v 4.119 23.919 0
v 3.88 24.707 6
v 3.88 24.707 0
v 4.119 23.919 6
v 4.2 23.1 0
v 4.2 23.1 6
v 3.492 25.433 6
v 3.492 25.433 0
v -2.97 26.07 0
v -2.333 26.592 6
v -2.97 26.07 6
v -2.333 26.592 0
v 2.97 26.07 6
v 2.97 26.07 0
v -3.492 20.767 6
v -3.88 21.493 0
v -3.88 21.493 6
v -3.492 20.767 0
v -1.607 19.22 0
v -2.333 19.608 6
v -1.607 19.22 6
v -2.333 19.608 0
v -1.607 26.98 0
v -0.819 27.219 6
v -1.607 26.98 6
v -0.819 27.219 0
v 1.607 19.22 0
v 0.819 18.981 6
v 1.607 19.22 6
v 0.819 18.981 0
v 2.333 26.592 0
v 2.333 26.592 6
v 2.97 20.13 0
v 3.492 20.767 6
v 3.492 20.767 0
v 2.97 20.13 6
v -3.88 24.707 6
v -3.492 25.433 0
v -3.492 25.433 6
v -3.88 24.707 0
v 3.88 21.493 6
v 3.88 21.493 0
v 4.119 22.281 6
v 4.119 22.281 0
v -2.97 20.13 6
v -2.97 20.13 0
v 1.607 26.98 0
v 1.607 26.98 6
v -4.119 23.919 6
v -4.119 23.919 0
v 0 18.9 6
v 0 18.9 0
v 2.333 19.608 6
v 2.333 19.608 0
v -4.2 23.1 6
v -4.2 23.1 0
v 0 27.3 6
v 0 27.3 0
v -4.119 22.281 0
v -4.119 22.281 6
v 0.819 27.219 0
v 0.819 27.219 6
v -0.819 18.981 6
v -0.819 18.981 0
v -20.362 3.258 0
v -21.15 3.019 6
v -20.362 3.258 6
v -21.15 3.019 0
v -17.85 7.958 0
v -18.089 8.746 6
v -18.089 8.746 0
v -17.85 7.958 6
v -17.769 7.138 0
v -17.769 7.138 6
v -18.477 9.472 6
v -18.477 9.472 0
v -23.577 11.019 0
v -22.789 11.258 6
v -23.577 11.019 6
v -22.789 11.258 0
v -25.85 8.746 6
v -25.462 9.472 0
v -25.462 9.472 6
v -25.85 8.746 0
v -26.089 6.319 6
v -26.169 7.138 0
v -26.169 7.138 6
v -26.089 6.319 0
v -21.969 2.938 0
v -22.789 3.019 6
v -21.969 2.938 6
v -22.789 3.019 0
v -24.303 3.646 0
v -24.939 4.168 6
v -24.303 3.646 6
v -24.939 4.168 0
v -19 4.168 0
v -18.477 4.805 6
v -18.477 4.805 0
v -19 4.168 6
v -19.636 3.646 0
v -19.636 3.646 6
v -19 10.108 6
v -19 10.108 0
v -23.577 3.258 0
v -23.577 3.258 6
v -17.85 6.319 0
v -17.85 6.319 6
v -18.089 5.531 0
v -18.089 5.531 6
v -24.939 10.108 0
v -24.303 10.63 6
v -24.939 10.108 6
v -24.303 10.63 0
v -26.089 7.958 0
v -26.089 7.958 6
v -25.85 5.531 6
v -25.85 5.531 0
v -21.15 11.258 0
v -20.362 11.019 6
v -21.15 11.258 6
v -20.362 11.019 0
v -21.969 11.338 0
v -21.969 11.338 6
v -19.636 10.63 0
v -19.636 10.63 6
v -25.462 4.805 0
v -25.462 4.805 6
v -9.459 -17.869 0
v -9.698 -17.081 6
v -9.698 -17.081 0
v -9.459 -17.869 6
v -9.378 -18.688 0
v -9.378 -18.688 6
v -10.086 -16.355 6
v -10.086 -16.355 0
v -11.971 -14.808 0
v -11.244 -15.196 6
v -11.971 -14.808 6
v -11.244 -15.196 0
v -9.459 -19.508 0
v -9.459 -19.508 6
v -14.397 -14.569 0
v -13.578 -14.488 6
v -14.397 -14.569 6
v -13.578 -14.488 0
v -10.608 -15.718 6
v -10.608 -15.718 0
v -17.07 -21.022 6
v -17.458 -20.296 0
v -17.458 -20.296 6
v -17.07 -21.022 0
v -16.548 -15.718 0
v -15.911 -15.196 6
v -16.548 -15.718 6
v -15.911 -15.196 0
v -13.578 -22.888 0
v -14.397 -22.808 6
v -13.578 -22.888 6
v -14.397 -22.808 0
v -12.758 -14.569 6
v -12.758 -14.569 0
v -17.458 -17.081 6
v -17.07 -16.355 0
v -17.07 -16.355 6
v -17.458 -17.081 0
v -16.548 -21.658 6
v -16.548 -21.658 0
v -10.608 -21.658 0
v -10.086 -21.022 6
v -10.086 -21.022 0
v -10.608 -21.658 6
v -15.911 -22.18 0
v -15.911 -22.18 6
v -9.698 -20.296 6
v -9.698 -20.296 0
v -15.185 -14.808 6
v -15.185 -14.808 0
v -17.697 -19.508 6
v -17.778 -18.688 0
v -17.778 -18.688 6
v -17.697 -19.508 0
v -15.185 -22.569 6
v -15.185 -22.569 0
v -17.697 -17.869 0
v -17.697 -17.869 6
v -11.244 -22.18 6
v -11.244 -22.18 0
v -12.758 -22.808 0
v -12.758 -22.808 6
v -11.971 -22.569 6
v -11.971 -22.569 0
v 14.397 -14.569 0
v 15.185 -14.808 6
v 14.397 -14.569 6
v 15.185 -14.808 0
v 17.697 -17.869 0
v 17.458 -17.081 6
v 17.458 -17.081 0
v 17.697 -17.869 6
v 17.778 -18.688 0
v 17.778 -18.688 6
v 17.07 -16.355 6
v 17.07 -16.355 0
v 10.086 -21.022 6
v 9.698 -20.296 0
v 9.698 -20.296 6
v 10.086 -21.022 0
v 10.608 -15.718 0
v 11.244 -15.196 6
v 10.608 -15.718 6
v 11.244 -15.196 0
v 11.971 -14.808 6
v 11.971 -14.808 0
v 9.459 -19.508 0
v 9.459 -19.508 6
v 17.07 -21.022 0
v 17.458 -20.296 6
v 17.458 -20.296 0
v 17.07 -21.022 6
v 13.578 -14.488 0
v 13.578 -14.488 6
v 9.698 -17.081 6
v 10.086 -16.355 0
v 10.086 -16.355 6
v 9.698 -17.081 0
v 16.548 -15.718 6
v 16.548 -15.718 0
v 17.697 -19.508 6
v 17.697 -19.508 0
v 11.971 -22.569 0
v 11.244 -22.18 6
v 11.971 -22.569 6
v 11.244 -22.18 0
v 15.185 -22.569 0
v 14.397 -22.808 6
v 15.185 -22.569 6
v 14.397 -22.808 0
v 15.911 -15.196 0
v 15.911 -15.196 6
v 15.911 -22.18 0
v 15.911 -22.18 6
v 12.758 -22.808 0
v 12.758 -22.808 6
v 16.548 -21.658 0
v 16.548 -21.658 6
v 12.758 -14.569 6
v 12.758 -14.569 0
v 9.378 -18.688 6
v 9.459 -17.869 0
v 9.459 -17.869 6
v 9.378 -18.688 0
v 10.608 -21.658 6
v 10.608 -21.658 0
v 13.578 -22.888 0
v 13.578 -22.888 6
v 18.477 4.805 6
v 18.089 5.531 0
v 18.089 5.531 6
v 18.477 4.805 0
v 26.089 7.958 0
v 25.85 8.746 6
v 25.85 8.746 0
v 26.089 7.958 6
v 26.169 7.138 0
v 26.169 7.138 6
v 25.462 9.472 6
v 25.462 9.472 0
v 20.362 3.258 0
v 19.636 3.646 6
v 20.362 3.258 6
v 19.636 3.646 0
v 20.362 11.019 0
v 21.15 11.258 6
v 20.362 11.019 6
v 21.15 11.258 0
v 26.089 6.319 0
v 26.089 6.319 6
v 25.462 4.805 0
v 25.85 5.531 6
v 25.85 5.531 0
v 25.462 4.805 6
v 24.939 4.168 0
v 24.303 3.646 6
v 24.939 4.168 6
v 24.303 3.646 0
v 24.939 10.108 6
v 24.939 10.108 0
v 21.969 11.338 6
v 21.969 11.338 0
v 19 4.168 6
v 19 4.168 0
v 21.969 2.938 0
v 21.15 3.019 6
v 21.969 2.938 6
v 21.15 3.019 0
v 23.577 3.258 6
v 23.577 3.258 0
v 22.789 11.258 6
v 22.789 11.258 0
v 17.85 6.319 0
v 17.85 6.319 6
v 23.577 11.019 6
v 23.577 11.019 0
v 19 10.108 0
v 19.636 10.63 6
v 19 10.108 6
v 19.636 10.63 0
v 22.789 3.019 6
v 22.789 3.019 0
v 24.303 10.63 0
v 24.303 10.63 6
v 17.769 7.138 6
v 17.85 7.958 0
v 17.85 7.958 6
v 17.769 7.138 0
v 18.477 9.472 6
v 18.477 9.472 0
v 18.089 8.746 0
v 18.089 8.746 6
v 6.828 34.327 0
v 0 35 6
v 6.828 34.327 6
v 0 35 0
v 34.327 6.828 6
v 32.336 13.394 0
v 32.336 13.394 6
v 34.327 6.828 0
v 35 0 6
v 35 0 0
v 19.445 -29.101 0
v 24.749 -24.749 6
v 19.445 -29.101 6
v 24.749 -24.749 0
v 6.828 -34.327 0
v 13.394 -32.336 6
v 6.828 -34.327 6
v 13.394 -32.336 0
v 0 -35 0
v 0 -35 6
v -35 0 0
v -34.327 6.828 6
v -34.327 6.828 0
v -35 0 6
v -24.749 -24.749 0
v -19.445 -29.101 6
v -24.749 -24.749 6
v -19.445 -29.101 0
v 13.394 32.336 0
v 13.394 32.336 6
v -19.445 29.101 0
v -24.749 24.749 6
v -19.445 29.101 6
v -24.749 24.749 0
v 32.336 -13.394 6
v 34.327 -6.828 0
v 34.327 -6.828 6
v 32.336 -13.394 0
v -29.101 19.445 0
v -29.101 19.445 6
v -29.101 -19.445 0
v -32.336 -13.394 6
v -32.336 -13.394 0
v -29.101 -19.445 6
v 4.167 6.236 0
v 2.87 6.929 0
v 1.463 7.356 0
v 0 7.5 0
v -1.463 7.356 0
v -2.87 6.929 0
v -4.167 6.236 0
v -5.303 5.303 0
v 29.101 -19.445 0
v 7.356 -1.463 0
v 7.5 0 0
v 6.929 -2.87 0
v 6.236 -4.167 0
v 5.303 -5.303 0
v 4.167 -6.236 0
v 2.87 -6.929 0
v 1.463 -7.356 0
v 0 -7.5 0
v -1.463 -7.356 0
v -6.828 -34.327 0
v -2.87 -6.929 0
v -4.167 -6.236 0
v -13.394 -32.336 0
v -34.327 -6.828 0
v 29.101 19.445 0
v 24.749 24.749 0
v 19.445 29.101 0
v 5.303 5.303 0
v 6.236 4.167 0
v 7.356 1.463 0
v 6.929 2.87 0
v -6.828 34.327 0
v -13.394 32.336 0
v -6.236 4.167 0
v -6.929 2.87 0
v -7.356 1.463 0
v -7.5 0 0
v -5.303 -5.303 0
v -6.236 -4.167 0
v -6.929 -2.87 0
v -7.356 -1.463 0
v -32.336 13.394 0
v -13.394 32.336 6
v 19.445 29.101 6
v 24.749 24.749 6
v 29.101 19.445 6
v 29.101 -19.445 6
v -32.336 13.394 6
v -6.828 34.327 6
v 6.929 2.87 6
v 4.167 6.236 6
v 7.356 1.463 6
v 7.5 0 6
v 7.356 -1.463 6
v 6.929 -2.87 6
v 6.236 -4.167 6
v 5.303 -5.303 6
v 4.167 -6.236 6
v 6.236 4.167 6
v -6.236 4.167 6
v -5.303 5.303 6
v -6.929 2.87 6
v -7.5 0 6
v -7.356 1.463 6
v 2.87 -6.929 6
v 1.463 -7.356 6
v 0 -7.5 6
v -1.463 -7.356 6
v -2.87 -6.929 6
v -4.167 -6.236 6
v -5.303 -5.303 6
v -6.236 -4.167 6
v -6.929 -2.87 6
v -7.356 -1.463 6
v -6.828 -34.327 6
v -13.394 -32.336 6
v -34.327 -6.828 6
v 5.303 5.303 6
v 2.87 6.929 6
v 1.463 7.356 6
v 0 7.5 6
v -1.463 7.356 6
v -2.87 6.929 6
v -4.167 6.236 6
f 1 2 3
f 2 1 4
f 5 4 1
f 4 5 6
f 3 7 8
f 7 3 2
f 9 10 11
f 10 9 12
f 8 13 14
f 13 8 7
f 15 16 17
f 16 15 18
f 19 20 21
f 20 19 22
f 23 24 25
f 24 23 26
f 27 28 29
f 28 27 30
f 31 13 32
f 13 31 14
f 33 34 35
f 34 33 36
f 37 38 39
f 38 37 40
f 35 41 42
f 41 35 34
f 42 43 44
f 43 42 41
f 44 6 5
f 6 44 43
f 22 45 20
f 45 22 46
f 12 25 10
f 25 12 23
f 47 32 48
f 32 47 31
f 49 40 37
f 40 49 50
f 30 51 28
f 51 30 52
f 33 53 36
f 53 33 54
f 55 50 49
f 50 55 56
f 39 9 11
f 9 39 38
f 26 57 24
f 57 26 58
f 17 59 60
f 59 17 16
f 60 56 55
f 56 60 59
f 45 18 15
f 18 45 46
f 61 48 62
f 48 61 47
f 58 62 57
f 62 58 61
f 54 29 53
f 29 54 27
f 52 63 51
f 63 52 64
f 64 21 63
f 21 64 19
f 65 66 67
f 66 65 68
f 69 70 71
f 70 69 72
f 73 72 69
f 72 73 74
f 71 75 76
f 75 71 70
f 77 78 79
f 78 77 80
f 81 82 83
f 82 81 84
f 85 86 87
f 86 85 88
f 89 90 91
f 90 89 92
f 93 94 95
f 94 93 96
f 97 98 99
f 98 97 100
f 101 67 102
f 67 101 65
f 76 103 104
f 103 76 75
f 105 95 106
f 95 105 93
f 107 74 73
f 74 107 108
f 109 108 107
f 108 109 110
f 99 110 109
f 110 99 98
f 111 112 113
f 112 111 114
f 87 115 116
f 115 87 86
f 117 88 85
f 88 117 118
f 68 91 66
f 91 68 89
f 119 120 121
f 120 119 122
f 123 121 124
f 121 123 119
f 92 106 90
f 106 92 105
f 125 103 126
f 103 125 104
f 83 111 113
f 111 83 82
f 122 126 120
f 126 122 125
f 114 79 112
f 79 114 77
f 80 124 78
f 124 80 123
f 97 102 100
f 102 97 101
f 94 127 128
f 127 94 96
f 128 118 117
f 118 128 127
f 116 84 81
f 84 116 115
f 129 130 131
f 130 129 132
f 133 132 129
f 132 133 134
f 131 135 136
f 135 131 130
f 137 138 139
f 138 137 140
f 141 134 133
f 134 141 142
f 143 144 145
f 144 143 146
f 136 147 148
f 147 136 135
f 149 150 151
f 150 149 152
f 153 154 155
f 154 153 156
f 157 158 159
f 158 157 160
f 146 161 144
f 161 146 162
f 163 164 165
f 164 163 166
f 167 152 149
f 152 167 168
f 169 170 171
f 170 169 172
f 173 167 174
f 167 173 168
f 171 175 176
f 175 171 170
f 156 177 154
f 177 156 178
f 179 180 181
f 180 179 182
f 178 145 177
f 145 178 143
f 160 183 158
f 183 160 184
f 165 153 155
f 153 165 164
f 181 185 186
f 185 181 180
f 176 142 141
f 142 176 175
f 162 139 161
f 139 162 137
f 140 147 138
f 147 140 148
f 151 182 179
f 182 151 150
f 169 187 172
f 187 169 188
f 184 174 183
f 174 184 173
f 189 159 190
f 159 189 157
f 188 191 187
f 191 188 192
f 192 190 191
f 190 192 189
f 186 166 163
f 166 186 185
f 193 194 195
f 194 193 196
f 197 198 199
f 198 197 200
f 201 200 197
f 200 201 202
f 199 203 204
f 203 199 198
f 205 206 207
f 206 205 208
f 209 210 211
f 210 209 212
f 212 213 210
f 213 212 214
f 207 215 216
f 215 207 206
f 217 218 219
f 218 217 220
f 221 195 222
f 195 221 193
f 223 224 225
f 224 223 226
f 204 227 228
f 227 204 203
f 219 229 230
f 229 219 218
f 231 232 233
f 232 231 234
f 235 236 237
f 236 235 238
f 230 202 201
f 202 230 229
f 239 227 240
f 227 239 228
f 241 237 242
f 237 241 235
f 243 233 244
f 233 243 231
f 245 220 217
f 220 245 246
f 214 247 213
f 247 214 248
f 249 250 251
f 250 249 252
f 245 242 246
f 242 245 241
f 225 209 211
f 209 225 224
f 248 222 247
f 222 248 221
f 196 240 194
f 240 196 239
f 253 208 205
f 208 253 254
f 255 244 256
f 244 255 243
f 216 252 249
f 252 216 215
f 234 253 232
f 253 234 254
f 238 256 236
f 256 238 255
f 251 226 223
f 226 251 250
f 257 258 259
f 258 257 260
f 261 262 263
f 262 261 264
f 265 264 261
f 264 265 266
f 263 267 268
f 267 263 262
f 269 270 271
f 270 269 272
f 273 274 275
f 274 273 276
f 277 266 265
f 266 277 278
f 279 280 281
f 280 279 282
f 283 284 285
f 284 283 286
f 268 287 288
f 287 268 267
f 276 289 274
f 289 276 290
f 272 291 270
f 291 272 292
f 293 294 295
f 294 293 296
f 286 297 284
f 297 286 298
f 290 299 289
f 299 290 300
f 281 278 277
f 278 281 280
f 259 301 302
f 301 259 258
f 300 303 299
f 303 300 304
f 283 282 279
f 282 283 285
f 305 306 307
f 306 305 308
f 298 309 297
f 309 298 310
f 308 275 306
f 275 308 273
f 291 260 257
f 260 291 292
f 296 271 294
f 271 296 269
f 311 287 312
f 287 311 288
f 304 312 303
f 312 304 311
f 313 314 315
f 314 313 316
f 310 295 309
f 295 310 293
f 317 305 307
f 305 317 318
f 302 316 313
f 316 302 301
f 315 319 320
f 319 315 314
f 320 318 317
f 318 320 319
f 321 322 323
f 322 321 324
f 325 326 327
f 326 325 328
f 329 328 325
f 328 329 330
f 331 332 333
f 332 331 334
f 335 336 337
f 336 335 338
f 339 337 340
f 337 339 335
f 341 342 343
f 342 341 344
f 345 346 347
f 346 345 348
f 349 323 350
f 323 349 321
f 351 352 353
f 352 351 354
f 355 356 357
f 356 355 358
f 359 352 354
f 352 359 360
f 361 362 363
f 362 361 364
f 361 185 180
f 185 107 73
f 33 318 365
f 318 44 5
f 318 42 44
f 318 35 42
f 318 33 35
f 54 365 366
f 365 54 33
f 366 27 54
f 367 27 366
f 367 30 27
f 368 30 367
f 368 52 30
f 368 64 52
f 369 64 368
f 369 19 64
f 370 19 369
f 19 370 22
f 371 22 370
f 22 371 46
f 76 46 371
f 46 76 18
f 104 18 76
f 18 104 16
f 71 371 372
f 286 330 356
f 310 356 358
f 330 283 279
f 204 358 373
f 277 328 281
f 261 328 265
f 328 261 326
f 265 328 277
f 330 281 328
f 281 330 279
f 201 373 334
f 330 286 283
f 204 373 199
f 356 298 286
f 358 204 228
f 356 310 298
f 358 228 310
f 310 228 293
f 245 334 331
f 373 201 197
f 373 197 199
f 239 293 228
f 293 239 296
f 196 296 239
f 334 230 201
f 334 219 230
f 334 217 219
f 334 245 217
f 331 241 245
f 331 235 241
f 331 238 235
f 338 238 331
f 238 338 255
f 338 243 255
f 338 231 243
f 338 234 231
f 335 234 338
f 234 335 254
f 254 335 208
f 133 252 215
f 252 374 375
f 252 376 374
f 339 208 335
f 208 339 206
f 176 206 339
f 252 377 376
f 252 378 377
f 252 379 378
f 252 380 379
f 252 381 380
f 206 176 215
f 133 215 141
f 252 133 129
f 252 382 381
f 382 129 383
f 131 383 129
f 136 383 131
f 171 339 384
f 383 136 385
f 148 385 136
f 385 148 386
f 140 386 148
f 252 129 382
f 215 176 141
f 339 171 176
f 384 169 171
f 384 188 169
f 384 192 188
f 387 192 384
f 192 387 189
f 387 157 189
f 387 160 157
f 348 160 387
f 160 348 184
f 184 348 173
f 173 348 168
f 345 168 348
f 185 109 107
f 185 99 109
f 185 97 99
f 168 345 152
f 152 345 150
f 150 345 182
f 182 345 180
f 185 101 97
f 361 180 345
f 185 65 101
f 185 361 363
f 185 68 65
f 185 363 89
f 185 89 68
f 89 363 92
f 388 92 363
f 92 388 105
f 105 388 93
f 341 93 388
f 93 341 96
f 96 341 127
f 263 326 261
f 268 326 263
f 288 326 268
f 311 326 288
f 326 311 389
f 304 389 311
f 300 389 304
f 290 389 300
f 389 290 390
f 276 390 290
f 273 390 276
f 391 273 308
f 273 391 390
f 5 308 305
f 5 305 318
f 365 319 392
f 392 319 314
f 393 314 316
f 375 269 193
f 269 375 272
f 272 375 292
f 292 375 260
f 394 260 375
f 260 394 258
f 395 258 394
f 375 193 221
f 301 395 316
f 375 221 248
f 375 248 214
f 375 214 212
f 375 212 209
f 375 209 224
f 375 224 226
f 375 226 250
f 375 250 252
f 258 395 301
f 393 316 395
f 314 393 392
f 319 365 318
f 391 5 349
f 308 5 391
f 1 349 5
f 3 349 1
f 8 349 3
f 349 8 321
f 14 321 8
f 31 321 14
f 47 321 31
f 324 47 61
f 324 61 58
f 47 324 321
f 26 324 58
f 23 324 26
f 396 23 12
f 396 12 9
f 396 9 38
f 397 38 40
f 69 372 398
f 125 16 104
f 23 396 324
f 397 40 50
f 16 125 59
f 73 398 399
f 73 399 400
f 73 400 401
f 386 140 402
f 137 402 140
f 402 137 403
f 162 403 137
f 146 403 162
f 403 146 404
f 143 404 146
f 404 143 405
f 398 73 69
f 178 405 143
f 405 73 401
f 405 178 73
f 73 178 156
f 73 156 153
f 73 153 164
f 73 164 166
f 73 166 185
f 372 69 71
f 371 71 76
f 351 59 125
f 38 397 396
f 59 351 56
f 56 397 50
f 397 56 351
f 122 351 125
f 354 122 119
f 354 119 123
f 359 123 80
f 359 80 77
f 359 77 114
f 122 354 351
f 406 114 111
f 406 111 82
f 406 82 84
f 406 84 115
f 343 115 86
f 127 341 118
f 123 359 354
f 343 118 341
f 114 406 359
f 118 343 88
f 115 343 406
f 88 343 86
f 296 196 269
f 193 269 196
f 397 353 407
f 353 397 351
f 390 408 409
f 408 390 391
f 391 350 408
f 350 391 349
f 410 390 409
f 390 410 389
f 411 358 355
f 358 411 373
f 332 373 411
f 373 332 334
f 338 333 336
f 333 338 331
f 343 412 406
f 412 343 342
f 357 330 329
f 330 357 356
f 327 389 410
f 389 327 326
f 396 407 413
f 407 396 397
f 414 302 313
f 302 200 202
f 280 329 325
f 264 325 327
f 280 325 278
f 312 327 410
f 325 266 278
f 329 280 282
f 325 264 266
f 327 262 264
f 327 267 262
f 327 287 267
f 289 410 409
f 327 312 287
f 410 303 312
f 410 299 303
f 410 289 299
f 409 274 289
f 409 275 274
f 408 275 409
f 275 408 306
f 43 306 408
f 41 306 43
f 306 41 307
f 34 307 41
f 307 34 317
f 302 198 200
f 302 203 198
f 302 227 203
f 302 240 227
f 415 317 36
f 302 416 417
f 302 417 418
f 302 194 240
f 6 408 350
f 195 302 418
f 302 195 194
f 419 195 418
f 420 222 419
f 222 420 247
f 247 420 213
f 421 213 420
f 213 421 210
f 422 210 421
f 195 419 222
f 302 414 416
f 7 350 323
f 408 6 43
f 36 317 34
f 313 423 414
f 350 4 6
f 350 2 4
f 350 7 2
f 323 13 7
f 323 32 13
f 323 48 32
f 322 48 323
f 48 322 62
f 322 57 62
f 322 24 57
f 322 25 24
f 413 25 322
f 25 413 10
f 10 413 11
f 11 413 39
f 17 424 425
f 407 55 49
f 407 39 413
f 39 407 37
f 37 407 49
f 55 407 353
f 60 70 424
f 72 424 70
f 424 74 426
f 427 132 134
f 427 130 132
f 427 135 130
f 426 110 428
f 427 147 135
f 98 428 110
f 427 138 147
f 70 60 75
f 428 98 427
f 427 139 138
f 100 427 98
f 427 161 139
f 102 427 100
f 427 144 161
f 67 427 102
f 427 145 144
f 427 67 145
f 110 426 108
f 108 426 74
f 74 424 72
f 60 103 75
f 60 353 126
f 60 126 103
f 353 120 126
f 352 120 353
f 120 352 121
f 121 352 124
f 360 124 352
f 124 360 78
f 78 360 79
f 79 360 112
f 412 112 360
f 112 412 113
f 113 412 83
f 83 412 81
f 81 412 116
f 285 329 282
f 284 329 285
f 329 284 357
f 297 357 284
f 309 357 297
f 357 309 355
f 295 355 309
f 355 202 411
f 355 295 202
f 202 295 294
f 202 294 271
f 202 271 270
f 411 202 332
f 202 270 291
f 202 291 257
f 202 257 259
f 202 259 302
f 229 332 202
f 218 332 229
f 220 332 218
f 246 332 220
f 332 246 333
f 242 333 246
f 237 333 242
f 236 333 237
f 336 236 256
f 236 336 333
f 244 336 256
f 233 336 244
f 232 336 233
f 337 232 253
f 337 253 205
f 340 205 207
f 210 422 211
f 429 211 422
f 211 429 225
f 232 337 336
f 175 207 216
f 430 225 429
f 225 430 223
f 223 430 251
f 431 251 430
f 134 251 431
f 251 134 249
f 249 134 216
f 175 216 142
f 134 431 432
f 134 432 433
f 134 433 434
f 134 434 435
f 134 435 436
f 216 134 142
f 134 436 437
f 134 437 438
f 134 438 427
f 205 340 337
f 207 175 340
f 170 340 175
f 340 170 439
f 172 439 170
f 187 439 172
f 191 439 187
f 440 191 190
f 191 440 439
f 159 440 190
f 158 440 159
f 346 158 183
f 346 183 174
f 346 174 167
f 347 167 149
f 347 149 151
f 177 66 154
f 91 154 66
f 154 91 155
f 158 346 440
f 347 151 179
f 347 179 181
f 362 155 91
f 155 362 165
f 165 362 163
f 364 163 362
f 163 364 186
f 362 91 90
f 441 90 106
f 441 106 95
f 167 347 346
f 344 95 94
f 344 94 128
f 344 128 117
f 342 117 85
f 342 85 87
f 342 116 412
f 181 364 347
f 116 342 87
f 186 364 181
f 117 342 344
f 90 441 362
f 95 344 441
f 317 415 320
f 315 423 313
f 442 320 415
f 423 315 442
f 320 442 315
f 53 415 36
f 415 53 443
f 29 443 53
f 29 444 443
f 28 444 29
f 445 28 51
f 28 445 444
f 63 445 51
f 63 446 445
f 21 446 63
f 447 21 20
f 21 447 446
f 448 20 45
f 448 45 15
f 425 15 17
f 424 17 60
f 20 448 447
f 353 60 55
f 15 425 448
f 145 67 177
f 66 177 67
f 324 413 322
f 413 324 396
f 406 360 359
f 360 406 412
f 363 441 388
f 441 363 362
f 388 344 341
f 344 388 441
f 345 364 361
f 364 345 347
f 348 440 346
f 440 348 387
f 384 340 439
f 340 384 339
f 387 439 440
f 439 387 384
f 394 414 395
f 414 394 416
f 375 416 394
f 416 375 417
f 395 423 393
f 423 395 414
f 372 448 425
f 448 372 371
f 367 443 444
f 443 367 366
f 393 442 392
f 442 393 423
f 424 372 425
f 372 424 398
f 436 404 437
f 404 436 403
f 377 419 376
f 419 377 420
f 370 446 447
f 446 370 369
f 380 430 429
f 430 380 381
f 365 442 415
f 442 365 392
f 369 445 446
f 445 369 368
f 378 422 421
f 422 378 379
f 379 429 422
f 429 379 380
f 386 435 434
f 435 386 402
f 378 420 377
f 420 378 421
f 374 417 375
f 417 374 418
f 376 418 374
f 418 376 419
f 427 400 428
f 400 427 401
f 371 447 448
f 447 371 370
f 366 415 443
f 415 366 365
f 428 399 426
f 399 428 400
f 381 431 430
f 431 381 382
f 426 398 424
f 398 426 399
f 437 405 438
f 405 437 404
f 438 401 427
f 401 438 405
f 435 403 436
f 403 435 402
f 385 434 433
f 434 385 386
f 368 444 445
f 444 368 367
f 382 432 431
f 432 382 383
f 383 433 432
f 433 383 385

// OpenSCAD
$fn = 32;

// ----------------------------------------------------------------------
// Flange Ø70 x 6
// 5 holes on a Ø46.2 bolt circle, bolted joints
// ----------------------------------------------------------------------

// --- parameters (mm) ---
flange_d = 70;   // outside diameter of the flange
thickness = 6;   // flange thickness
holes = 5;       // number of bolt holes
pcd = 46.2;      // bolt circle diameter
start_deg = 90;  // angle of the first hole, from +X
hole_d = 8.4;    // bolt hole diameter
bore_d = 15;     // central through bore
hub_d = 25;      // hub outside diameter
hub_h = 0;       // hub height above the flange face (0 = no hub)

// --- derived feature positions (mm) ---
height = thickness + hub_h;  // = 6   overall height of the part
pcd_r = pcd / 2;             // = 23.1   bolt circle radius
hole_step = 360 / holes;     // = 72   angular pitch
feature_centers = [
  [pcd_r * cos(start_deg + 0 * hole_step), pcd_r * sin(start_deg + 0 * hole_step)],
  [pcd_r * cos(start_deg + 1 * hole_step), pcd_r * sin(start_deg + 1 * hole_step)],
  [pcd_r * cos(start_deg + 2 * hole_step), pcd_r * sin(start_deg + 2 * hole_step)],
  [pcd_r * cos(start_deg + 3 * hole_step), pcd_r * sin(start_deg + 3 * hole_step)],
  [pcd_r * cos(start_deg + 4 * hole_step), pcd_r * sin(start_deg + 4 * hole_step)]
];   // bolt hole centres on the pitch circle

// flange disc, every hole and the bore cut straight through
difference() {
  union() {
    cylinder(d = flange_d, h = thickness);
  }
  translate([0, 0, -1]) cylinder(d = bore_d, h = height + 2);  // bore, through
  for (centre = feature_centers)
    translate([centre[0], centre[1], -1]) cylinder(d = hole_d, h = thickness + 2);
}
